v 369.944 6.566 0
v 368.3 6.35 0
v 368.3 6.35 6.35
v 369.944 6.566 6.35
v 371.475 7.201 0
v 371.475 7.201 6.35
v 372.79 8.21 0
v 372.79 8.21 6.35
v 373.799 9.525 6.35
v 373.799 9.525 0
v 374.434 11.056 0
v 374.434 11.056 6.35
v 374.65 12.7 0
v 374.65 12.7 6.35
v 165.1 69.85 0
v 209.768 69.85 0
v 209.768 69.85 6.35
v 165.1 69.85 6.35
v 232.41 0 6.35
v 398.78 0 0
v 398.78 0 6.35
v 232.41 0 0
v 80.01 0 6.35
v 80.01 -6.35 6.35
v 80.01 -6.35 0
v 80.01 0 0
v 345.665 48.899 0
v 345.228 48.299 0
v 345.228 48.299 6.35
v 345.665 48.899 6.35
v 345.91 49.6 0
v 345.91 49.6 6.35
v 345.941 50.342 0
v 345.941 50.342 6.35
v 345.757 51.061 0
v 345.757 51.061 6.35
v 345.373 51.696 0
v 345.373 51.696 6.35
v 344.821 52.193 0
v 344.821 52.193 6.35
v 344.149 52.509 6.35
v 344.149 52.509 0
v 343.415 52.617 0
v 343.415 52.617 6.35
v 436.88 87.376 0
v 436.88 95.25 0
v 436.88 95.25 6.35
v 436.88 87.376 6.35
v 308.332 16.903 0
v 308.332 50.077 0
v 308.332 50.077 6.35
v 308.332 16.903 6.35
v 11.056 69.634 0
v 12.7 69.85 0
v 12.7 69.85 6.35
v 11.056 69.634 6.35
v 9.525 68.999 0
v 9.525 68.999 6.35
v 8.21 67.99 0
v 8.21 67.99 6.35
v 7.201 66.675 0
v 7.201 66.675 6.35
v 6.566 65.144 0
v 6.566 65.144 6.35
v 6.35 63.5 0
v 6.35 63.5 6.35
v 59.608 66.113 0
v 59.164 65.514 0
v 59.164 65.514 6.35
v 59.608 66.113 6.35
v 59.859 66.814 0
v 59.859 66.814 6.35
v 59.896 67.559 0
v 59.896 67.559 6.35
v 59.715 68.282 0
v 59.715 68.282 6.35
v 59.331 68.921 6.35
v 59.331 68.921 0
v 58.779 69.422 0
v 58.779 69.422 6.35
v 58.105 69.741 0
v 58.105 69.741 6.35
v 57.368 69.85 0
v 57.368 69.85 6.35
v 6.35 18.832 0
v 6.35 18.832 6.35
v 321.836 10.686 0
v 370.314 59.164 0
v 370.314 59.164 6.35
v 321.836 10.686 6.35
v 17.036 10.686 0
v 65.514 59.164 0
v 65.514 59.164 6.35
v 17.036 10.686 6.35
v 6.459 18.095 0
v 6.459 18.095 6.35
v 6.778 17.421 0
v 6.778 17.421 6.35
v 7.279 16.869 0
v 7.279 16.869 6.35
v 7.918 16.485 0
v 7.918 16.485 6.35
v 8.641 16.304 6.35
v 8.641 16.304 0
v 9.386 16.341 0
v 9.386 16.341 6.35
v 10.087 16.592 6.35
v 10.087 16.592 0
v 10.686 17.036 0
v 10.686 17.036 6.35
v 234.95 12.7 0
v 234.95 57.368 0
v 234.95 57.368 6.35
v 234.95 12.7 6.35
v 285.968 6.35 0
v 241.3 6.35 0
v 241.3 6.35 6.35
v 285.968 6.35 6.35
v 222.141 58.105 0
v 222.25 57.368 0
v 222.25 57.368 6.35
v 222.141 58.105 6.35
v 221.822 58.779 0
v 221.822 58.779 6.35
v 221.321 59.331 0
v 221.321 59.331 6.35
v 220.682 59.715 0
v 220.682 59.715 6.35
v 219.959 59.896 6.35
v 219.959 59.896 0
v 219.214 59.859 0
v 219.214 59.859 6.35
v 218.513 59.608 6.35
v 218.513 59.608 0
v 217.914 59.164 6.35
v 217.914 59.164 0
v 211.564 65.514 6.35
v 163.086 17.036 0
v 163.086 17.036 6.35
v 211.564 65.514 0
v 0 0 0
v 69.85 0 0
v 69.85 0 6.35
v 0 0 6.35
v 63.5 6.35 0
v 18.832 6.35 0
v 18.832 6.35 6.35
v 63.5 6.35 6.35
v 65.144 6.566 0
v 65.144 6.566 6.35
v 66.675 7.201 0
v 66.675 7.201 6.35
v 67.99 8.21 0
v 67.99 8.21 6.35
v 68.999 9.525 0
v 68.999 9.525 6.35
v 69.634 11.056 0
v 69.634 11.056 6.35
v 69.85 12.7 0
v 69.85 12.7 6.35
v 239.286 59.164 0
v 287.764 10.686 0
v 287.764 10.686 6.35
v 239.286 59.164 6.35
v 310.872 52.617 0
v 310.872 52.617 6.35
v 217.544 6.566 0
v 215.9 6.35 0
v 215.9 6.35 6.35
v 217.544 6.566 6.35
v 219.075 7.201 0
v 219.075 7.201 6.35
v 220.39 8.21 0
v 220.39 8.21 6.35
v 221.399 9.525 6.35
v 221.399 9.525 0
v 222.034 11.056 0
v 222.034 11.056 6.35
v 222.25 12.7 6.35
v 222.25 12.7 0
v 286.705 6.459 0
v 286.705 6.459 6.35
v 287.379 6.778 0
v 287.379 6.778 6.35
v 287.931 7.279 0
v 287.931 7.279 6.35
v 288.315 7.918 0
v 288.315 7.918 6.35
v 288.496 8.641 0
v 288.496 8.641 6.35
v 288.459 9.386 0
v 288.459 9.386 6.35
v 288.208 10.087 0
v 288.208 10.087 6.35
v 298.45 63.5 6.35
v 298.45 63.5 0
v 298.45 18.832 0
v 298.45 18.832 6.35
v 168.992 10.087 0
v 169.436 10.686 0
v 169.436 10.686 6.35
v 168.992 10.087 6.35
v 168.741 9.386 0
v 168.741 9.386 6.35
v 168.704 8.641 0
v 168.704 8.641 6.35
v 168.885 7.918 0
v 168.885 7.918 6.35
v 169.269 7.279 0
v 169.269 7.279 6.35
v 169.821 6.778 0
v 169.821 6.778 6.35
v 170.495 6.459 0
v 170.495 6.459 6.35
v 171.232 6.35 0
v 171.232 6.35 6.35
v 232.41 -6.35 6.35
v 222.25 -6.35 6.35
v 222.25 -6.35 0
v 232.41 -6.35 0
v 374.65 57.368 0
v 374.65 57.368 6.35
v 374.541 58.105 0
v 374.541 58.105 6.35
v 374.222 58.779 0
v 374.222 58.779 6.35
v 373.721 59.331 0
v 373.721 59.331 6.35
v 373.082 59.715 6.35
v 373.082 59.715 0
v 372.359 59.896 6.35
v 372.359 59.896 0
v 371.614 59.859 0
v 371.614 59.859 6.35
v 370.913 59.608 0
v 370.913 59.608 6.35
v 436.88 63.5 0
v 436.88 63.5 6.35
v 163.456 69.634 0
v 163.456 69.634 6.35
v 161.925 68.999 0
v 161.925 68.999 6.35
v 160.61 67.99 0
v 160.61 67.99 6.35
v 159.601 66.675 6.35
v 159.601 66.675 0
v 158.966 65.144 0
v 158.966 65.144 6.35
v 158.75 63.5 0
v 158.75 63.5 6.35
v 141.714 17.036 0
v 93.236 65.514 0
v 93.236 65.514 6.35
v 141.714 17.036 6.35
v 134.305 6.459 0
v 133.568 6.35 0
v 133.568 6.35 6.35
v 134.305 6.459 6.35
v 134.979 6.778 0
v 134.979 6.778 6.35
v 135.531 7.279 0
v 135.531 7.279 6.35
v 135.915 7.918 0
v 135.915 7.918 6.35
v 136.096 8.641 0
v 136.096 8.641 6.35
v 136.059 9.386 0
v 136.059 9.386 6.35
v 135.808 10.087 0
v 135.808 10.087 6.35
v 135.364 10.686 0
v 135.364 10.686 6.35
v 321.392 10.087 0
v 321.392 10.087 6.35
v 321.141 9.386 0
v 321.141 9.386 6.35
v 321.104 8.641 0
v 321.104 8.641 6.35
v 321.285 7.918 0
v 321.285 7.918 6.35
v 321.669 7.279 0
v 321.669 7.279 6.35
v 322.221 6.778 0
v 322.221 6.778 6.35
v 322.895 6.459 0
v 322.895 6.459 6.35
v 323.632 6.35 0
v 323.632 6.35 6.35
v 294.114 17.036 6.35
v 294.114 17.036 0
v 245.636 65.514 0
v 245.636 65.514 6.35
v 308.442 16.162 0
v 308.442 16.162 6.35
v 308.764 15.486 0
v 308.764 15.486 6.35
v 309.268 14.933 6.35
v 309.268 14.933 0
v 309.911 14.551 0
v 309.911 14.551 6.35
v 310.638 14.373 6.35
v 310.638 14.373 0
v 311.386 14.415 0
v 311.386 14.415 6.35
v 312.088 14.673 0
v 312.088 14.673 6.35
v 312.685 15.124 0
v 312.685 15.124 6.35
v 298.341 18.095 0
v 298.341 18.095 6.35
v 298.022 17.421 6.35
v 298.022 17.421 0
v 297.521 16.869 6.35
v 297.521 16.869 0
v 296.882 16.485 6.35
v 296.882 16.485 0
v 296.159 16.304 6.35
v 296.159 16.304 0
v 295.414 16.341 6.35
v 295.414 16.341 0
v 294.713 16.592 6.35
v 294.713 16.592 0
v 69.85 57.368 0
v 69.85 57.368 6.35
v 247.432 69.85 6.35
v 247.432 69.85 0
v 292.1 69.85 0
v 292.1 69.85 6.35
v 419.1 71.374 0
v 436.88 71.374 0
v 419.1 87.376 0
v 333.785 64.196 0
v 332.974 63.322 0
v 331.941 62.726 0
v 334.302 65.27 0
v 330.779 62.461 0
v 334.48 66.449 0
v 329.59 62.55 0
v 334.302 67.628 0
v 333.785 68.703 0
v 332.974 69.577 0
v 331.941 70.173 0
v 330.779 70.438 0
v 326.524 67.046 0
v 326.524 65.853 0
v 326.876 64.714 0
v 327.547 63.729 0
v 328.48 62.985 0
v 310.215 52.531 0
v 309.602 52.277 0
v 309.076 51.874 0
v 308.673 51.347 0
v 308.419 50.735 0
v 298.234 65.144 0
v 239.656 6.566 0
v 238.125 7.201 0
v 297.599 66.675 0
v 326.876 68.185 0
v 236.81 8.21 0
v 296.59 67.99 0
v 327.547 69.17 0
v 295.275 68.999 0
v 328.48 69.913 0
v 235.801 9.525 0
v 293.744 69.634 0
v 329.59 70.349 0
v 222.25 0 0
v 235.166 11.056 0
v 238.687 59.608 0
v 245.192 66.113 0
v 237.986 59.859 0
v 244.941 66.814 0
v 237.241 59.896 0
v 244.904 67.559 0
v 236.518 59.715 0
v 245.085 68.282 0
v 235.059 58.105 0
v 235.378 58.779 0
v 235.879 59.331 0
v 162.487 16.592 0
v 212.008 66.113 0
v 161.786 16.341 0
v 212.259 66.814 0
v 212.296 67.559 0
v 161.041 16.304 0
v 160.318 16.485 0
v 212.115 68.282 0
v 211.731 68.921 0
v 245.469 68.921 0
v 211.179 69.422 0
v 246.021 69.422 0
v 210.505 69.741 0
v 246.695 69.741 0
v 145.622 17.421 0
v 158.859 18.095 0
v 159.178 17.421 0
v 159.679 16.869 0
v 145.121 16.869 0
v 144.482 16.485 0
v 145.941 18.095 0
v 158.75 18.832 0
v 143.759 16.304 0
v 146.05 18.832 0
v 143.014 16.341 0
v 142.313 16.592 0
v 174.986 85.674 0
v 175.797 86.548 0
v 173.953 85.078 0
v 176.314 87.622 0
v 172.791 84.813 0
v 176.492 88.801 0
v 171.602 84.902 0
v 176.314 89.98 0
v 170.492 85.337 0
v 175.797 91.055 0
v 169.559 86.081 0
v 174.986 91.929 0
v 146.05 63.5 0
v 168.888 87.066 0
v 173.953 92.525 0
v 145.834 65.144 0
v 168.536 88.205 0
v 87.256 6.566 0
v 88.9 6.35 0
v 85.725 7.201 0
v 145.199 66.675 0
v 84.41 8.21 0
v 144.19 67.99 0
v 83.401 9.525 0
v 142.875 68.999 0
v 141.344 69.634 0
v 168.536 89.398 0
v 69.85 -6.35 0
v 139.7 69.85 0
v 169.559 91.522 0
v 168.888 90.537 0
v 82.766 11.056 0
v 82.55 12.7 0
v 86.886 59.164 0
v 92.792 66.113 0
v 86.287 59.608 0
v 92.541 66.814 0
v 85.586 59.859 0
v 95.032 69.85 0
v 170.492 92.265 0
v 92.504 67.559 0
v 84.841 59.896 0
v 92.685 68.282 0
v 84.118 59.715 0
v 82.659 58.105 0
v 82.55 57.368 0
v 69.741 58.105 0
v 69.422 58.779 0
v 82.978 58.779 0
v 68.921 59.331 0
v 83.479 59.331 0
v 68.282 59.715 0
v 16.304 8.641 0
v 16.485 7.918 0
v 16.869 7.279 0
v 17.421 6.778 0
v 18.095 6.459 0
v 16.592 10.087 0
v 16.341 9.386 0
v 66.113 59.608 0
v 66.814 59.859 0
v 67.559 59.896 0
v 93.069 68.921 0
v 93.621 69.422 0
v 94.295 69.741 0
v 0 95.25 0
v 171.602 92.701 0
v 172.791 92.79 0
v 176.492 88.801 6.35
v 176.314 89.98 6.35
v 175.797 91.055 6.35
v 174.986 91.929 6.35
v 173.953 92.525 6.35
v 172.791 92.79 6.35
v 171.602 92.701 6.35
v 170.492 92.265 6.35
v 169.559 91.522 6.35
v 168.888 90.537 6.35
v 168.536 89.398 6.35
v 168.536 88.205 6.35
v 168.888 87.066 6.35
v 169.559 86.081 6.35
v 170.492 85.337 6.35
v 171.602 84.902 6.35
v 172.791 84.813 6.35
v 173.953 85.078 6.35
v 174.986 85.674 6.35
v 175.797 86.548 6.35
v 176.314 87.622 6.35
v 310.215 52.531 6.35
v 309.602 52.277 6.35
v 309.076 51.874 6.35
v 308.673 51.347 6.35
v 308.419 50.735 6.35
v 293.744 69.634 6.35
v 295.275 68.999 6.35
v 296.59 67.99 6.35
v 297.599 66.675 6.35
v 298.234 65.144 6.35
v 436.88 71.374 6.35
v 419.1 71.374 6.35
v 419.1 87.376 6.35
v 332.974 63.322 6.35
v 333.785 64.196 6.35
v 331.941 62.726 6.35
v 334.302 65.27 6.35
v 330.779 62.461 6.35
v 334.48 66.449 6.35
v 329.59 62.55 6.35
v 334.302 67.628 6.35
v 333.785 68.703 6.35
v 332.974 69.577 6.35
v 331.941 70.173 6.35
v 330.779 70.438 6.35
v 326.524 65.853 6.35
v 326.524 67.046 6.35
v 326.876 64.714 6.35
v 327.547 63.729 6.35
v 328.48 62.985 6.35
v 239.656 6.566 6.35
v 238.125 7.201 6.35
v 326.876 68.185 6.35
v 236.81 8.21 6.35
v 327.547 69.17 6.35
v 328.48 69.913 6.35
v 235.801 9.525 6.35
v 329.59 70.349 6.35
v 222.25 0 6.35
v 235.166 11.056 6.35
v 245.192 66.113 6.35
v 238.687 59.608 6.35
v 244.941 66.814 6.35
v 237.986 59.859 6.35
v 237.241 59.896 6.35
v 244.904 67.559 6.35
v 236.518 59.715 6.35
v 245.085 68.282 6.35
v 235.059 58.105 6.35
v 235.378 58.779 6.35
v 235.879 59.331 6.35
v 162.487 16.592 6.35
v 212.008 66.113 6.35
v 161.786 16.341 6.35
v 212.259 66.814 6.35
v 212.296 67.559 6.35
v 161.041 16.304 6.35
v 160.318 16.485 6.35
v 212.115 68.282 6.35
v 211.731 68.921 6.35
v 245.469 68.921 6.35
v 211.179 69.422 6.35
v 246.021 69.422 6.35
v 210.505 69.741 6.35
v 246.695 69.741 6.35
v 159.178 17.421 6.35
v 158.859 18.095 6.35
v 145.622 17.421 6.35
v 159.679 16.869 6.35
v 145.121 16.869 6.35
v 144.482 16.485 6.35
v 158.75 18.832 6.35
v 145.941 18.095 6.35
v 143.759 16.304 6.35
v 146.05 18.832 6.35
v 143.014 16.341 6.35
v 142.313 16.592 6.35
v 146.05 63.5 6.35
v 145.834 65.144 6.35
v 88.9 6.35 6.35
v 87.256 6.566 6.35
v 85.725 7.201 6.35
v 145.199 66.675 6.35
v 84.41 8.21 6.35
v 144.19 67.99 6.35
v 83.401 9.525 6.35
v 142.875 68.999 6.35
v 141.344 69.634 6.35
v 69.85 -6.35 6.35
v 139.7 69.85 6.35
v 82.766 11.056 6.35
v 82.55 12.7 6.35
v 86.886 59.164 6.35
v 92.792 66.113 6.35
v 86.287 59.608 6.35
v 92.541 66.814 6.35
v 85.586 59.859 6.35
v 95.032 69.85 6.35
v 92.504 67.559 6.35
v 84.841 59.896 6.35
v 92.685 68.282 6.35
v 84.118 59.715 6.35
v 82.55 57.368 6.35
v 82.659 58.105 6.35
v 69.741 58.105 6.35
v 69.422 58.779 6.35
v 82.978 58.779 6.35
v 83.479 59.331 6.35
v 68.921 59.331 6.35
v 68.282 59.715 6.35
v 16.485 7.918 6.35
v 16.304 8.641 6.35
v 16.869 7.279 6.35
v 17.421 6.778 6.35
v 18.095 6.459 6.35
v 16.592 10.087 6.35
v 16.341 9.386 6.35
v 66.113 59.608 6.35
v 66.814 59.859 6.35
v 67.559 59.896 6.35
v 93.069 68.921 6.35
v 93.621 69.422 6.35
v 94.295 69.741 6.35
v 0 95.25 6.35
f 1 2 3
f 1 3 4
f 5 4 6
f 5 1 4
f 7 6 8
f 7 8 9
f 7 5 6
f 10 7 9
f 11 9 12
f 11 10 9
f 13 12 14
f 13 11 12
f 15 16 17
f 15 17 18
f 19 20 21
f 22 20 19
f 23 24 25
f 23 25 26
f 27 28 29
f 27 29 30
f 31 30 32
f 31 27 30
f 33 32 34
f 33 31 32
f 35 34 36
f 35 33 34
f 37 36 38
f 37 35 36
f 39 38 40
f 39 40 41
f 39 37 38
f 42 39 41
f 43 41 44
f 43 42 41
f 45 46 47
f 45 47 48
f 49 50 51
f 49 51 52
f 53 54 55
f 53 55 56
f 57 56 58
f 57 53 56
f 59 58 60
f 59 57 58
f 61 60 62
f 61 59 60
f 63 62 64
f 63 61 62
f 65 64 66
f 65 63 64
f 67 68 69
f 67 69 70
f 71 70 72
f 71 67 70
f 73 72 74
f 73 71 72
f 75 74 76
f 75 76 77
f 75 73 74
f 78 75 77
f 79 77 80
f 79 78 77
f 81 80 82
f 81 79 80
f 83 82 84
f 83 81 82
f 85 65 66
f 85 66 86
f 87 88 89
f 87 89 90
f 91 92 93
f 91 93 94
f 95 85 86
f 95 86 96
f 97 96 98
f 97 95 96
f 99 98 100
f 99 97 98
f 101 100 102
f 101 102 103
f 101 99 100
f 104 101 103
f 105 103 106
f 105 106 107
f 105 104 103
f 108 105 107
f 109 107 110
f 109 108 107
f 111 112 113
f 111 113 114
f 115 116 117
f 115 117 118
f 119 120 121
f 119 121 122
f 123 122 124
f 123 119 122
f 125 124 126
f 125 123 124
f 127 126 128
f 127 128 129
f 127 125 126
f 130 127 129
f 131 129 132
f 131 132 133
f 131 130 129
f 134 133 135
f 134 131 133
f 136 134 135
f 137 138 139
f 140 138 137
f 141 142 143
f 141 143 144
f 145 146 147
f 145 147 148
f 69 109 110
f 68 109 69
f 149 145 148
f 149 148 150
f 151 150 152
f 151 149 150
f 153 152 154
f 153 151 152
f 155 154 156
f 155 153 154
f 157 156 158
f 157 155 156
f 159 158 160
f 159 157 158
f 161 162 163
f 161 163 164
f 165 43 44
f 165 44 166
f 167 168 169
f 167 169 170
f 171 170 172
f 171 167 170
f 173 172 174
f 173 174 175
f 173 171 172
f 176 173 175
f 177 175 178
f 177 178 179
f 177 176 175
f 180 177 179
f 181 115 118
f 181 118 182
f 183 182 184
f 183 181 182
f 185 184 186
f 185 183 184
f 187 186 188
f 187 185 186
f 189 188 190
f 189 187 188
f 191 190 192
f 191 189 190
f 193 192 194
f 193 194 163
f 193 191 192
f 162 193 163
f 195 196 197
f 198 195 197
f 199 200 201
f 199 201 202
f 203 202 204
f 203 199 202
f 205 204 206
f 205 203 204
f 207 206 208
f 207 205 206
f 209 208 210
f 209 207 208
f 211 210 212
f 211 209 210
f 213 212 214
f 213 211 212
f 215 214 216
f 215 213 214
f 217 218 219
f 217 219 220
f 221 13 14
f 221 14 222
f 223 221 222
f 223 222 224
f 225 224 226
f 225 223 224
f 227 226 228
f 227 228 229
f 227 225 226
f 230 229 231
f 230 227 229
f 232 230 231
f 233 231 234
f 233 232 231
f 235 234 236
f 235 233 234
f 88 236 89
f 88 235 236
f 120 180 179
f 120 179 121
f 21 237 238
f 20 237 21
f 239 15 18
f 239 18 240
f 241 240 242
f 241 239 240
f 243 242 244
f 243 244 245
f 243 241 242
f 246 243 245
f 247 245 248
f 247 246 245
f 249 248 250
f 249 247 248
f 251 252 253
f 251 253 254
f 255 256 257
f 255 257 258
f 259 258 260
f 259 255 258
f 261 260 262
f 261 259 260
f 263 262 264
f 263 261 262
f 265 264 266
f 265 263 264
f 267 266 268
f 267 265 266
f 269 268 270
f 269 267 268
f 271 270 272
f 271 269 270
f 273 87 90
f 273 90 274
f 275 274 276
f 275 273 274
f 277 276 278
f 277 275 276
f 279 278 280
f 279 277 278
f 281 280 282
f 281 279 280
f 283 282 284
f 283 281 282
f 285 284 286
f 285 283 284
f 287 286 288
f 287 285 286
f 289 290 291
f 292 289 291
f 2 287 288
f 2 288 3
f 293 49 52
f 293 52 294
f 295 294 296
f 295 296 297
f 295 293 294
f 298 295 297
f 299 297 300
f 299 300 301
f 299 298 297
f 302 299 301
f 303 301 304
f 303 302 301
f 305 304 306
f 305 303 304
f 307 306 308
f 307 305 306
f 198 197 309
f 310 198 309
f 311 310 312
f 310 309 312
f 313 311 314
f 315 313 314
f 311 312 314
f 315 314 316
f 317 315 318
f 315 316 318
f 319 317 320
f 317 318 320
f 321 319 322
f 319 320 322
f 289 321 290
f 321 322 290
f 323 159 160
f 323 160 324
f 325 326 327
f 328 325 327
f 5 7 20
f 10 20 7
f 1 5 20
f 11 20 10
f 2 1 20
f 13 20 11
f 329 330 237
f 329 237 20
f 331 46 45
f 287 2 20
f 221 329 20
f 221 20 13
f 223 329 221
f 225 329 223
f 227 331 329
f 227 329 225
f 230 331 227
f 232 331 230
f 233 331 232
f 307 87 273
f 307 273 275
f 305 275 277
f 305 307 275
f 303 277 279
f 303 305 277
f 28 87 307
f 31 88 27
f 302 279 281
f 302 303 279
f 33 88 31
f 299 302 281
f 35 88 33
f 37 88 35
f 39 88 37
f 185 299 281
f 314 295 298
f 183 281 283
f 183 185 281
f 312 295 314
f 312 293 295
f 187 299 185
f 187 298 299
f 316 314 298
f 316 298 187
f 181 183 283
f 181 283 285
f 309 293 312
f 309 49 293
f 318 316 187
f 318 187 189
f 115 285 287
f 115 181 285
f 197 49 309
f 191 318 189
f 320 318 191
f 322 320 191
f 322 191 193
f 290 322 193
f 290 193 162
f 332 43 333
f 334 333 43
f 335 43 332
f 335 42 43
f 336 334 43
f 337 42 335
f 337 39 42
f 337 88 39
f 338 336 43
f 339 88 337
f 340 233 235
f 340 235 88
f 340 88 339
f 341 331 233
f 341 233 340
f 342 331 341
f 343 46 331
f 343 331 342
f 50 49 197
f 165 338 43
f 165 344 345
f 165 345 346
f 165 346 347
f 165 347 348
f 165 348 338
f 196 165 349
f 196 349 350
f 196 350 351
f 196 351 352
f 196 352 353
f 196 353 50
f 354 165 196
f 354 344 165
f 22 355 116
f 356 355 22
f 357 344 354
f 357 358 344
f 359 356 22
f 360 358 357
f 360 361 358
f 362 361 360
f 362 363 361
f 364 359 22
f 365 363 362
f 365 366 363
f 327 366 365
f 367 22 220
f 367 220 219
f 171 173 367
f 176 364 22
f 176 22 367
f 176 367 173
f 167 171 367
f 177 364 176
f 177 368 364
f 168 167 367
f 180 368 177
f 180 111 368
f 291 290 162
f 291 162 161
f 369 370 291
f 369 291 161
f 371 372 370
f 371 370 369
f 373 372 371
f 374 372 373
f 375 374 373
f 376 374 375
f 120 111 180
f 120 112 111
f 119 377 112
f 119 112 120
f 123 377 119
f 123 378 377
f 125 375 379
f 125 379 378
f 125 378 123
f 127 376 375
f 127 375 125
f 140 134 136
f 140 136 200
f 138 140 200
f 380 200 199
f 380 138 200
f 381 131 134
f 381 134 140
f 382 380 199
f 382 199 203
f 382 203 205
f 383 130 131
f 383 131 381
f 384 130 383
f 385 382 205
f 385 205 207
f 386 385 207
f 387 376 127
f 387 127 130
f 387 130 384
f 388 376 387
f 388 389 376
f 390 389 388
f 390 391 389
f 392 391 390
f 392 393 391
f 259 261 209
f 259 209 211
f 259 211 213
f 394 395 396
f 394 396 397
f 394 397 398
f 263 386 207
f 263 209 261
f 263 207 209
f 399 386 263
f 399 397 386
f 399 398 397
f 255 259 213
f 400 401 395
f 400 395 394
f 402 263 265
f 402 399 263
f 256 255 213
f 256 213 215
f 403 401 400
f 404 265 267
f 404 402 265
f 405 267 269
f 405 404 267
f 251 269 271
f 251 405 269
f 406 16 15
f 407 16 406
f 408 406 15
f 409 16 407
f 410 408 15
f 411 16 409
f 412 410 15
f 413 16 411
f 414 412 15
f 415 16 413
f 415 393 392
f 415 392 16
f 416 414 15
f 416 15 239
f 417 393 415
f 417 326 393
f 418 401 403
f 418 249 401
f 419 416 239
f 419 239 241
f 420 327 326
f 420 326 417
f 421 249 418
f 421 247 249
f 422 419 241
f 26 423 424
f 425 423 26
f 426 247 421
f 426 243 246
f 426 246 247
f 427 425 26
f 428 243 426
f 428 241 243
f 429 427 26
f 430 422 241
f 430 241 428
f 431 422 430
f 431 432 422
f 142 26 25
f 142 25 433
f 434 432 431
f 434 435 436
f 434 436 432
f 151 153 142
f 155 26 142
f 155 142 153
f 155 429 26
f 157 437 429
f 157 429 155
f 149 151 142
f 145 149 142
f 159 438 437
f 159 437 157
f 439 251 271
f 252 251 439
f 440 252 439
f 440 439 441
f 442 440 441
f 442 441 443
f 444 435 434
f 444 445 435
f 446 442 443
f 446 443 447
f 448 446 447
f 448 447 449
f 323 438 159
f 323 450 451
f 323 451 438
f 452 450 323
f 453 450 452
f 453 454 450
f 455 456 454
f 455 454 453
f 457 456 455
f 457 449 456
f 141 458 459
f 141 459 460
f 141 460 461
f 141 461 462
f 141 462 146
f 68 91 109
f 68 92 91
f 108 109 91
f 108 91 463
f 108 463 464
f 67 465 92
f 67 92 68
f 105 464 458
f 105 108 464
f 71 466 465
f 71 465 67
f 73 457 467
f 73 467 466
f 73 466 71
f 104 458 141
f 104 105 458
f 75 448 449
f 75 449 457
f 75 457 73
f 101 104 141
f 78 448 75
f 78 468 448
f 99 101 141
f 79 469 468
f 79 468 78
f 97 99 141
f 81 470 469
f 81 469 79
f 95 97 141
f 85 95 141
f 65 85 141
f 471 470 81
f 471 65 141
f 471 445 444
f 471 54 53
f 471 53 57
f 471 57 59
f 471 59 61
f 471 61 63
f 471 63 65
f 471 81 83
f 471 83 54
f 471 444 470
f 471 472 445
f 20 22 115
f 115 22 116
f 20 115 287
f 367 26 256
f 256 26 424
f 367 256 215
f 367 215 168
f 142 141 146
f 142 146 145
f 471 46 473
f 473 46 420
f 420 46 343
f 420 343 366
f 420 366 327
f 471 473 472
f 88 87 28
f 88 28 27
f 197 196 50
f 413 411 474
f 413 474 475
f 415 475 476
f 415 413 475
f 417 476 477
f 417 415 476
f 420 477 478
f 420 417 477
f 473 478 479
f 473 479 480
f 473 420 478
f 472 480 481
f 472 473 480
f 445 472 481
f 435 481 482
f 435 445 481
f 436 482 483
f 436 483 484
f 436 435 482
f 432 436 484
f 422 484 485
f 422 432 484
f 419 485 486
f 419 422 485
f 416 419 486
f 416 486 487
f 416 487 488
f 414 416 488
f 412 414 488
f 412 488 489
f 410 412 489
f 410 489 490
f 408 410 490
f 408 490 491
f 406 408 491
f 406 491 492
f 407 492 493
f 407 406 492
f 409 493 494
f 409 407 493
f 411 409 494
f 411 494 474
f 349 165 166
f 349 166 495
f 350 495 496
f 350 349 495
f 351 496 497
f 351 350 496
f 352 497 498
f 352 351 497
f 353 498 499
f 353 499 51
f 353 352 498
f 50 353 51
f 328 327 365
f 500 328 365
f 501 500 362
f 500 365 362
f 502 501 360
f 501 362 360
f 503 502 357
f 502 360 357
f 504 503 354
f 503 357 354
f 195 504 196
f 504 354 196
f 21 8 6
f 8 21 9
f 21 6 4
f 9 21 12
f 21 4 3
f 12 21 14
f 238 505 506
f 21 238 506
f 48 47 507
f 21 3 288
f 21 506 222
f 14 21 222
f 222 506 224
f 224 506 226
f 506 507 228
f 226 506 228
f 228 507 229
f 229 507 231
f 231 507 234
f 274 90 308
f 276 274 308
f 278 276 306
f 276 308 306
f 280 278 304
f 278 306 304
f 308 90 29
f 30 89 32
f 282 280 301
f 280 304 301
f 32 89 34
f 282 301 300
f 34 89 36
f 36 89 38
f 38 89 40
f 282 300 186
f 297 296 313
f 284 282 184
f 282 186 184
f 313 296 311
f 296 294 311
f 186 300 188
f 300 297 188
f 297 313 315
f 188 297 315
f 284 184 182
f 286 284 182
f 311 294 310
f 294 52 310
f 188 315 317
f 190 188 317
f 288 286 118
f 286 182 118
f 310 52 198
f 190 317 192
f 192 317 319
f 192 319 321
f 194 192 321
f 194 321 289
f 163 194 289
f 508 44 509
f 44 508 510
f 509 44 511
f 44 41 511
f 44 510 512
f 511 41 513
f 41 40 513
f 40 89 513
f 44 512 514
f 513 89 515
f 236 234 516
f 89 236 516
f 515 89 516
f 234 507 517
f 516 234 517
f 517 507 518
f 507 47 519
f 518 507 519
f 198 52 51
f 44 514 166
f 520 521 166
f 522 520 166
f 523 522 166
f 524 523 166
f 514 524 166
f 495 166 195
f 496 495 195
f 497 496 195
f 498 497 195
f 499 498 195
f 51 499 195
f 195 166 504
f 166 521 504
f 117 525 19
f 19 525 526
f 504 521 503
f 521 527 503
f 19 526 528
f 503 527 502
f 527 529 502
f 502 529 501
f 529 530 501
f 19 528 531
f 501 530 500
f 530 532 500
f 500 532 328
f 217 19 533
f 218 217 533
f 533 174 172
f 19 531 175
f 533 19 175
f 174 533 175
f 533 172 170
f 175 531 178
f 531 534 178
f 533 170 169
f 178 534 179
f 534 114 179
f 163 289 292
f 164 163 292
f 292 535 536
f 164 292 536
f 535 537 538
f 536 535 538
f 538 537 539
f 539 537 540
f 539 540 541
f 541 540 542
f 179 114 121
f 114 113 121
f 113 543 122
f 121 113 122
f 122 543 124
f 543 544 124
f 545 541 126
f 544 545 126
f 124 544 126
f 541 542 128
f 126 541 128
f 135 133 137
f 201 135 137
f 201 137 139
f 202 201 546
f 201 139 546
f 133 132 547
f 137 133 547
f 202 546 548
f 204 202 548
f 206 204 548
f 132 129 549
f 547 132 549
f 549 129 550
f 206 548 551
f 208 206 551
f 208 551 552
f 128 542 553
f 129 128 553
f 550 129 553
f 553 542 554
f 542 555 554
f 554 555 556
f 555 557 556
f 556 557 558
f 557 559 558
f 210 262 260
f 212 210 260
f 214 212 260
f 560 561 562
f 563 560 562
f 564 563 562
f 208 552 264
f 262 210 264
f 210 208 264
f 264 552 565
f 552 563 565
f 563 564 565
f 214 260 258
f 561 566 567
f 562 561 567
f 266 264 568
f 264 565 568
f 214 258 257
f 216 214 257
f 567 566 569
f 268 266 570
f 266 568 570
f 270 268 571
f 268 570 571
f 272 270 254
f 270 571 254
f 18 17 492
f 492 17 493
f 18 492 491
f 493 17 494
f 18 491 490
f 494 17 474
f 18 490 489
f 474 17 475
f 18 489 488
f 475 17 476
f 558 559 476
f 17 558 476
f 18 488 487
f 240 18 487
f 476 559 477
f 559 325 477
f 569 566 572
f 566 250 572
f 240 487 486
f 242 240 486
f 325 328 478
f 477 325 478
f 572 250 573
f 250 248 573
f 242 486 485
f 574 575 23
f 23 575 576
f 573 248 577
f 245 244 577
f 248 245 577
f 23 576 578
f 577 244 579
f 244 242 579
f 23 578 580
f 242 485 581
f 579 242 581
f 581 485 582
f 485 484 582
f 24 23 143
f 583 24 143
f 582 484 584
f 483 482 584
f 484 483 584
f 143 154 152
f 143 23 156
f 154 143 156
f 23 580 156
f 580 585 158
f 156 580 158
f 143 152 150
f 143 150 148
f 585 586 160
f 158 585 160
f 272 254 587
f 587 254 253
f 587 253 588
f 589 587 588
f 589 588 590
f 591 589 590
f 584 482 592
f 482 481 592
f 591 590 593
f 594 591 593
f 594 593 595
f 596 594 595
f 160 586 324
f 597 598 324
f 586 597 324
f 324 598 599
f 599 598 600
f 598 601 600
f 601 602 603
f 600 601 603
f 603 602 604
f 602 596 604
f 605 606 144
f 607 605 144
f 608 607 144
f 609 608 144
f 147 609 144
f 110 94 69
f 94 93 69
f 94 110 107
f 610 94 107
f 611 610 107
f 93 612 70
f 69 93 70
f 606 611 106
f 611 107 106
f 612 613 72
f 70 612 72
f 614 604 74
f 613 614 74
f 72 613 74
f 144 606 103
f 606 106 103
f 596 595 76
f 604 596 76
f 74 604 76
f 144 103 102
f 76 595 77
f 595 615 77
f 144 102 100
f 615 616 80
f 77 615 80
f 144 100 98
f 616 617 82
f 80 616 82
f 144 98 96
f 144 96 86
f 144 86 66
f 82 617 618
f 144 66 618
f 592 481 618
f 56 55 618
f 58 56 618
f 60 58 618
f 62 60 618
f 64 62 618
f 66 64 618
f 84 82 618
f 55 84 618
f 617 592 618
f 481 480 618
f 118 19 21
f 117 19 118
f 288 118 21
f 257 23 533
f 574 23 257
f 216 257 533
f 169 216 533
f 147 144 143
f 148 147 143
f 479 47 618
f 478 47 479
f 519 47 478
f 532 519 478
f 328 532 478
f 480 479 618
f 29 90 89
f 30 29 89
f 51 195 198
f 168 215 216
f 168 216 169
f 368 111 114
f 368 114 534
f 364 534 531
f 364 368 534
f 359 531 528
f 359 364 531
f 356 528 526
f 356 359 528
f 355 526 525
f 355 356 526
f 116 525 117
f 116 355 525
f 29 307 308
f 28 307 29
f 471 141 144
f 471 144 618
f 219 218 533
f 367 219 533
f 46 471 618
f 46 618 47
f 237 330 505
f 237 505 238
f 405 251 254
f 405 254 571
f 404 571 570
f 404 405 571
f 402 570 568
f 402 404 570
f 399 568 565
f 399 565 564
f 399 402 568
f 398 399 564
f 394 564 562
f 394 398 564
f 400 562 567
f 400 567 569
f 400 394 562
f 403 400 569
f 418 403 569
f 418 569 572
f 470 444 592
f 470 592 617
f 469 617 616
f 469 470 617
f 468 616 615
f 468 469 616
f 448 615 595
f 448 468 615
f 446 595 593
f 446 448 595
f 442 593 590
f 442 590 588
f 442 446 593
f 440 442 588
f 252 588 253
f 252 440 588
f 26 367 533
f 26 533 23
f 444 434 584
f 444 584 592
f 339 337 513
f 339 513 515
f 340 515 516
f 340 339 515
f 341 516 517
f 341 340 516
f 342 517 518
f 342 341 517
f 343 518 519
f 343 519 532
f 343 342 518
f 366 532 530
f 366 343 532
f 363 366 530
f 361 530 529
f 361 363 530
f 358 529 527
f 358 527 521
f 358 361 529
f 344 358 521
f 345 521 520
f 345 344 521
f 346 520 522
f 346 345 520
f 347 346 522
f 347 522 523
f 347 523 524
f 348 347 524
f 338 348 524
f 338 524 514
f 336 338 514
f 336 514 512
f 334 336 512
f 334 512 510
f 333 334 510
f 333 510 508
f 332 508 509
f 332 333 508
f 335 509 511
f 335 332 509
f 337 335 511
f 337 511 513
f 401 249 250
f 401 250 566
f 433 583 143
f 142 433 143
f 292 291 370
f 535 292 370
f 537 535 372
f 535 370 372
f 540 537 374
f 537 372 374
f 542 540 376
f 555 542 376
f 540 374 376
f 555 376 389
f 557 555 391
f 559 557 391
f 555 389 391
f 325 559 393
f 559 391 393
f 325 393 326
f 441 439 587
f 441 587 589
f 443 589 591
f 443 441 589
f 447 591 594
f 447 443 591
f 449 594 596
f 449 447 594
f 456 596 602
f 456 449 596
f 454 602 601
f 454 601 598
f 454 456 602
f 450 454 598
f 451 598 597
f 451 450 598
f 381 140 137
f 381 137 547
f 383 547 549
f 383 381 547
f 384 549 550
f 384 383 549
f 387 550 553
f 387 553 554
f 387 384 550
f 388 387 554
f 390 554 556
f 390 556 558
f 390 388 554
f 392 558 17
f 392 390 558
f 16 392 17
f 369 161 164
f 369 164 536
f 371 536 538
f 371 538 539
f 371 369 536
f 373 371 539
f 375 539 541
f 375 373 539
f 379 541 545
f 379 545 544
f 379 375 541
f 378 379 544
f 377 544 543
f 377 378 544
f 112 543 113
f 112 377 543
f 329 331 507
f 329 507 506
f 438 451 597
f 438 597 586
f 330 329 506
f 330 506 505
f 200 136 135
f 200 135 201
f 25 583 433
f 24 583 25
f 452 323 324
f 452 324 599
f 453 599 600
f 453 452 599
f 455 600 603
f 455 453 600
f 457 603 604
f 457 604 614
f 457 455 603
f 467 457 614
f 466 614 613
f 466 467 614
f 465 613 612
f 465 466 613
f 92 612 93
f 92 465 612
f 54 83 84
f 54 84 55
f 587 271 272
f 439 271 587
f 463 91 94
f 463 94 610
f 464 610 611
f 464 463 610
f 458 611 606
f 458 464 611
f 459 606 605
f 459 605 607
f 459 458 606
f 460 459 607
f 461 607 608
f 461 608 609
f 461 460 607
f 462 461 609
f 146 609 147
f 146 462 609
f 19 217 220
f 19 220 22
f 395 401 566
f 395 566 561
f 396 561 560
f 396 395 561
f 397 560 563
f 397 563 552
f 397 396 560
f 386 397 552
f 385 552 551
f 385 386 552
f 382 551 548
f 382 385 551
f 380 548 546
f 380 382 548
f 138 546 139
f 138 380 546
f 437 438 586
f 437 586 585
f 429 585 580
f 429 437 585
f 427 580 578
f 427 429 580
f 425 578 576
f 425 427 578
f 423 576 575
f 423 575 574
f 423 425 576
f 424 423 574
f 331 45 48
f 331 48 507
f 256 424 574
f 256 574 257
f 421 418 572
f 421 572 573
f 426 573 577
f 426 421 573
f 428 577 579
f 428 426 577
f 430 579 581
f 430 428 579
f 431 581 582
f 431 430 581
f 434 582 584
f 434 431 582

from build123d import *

# Parameters (mm, degrees)
MODEL_R             = 4
BOSS_EXTRUDE2_DEPTH = 6.35
SKETCH1_W           = 10.16
SKETCH1_H           = 6.35
BOSS_EXTRUDE3_DEPTH = 6.35


with BuildPart() as part:
    # Model → Boss-Extrude2 (new body)
    with BuildSketch(Plane.XY):
        Polygon((419.1, 87.376), (419.1, 71.374), (436.88, 71.374), (436.88, 63.5), (398.78, 0), (0, 0), (0, 95.25), (436.88, 95.25), (436.88, 87.376), align=None)
        with Locations((172.491700482, 88.801347744)):
            Circle(MODEL_R, mode=Mode.SUBTRACT)
        with Locations((330.479700482, 66.449347744)):
            Circle(MODEL_R, mode=Mode.SUBTRACT)
        with BuildLine():
            Line((312.685453403, 15.123873353), (345.228141797, 48.298807013))
            ThreePointArc((345.228141797, 48.298807013), (345.756846653, 51.060789203), (343.414895332, 52.617496771))
            Line((343.414895332, 52.617496771), (310.872206937, 52.617496771))
            ThreePointArc((310.872206937, 52.617496771), (309.076155713, 51.873547995), (308.332206937, 50.077496771))
            Line((308.332206937, 50.077496771), (308.332206937, 16.902563111))
            ThreePointArc((308.332206937, 16.902563111), (309.911490023, 14.551260704), (312.685453403, 15.123873353))
        make_face(mode=Mode.SUBTRACT)
        with BuildLine():
            Line((171.232102448, 6.35), (215.9, 6.35))
            ThreePointArc((215.9, 6.35), (220.390128061, 8.209871939), (222.25, 12.7))
            Line((222.25, 12.7), (222.25, 57.367897552))
            ThreePointArc((222.25, 57.367897552), (220.682015918, 59.714551565), (217.913948776, 59.163948776))
            Line((217.913948776, 59.163948776), (169.436051224, 10.686051224))
            ThreePointArc((169.436051224, 10.686051224), (168.885448435, 7.917984082), (171.232102448, 6.35))
        make_face(mode=Mode.SUBTRACT)
        with BuildLine():
            Line((234.95, 57.367897552), (234.95, 12.7))
            ThreePointArc((234.95, 12.7), (236.809871939, 8.209871939), (241.3, 6.35))
            Line((241.3, 6.35), (285.967897552, 6.35))
            ThreePointArc((285.967897552, 6.35), (288.314551565, 7.917984082), (287.763948776, 10.686051224))
            Line((287.763948776, 10.686051224), (239.286051224, 59.163948776))
            ThreePointArc((239.286051224, 59.163948776), (236.517984082, 59.714551565), (234.95, 57.367897552))
        make_face(mode=Mode.SUBTRACT)
        with BuildLine():
            Line((294.113948776, 17.036051224), (245.636051224, 65.513948776))
            ThreePointArc((245.636051224, 65.513948776), (245.085448435, 68.282015918), (247.432102448, 69.85))
            Line((247.432102448, 69.85), (292.1, 69.85))
            ThreePointArc((292.1, 69.85), (296.590128061, 67.990128061), (298.45, 63.5))
            Line((298.45, 63.5), (298.45, 18.832102448))
            ThreePointArc((298.45, 18.832102448), (296.882015918, 16.485448435), (294.113948776, 17.036051224))
        make_face(mode=Mode.SUBTRACT)
        with BuildLine():
            Line((323.632102448, 6.35), (368.3, 6.35))
            ThreePointArc((368.3, 6.35), (372.790128061, 8.209871939), (374.65, 12.7))
            Line((374.65, 12.7), (374.65, 57.367897552))
            ThreePointArc((374.65, 57.367897552), (373.082015918, 59.714551565), (370.313948776, 59.163948776))
            Line((370.313948776, 59.163948776), (321.836051224, 10.686051224))
            ThreePointArc((321.836051224, 10.686051224), (321.285448435, 7.917984082), (323.632102448, 6.35))
        make_face(mode=Mode.SUBTRACT)
        with BuildLine():
            Line((18.832102448, 6.35), (63.5, 6.35))
            ThreePointArc((63.5, 6.35), (67.990128061, 8.209871939), (69.85, 12.7))
            Line((69.85, 12.7), (69.85, 57.367897552))
            ThreePointArc((69.85, 57.367897552), (68.282015918, 59.714551565), (65.513948776, 59.163948776))
            Line((65.513948776, 59.163948776), (17.036051224, 10.686051224))
            ThreePointArc((17.036051224, 10.686051224), (16.485448435, 7.917984082), (18.832102448, 6.35))
        make_face(mode=Mode.SUBTRACT)
        with BuildLine():
            Line((82.55, 57.367897552), (82.55, 12.7))
            ThreePointArc((82.55, 12.7), (84.409871939, 8.209871939), (88.9, 6.35))
            Line((88.9, 6.35), (133.567897552, 6.35))
            ThreePointArc((133.567897552, 6.35), (135.914551565, 7.917984082), (135.363948776, 10.686051224))
            Line((135.363948776, 10.686051224), (86.886051224, 59.163948776))
            ThreePointArc((86.886051224, 59.163948776), (84.117984082, 59.714551565), (82.55, 57.367897552))
        make_face(mode=Mode.SUBTRACT)
        with BuildLine():
            Line((93.236051224, 65.513948776), (141.713948776, 17.036051224))
            ThreePointArc((141.713948776, 17.036051224), (144.482015918, 16.485448435), (146.05, 18.832102448))
            Line((146.05, 18.832102448), (146.05, 63.5))
            ThreePointArc((146.05, 63.5), (144.190128061, 67.990128061), (139.7, 69.85))
            Line((139.7, 69.85), (95.032102448, 69.85))
            ThreePointArc((95.032102448, 69.85), (92.685448435, 68.282015918), (93.236051224, 65.513948776))
        make_face(mode=Mode.SUBTRACT)
        with BuildLine():
            Line((163.086051224, 17.036051224), (211.563948776, 65.513948776))
            ThreePointArc((211.563948776, 65.513948776), (212.114551565, 68.282015918), (209.767897552, 69.85))
            Line((209.767897552, 69.85), (165.1, 69.85))
            ThreePointArc((165.1, 69.85), (160.609871939, 67.990128061), (158.75, 63.5))
            Line((158.75, 63.5), (158.75, 18.832102448))
            ThreePointArc((158.75, 18.832102448), (160.317984082, 16.485448435), (163.086051224, 17.036051224))
        make_face(mode=Mode.SUBTRACT)
        with BuildLine():
            Line((6.35, 63.5), (6.35, 18.832102448))
            ThreePointArc((6.35, 18.832102448), (7.917984082, 16.485448435), (10.686051224, 17.036051224))
            Line((10.686051224, 17.036051224), (59.163948776, 65.513948776))
            ThreePointArc((59.163948776, 65.513948776), (59.714551565, 68.282015918), (57.367897552, 69.85))
            Line((57.367897552, 69.85), (12.7, 69.85))
            ThreePointArc((12.7, 69.85), (8.209871939, 67.990128061), (6.35, 63.5))
        make_face(mode=Mode.SUBTRACT)
    extrude(amount=BOSS_EXTRUDE2_DEPTH)

    # Sketch1 → Boss-Extrude3 (add)
    with BuildSketch(Plane.XY.offset(6.35)):
        with Locations((74.93, -3.175)):
            Rectangle(SKETCH1_W, SKETCH1_H)
        with Locations((227.33, -3.175)):
            Rectangle(SKETCH1_W, SKETCH1_H)
    extrude(amount=-BOSS_EXTRUDE3_DEPTH)


solid = part.part
